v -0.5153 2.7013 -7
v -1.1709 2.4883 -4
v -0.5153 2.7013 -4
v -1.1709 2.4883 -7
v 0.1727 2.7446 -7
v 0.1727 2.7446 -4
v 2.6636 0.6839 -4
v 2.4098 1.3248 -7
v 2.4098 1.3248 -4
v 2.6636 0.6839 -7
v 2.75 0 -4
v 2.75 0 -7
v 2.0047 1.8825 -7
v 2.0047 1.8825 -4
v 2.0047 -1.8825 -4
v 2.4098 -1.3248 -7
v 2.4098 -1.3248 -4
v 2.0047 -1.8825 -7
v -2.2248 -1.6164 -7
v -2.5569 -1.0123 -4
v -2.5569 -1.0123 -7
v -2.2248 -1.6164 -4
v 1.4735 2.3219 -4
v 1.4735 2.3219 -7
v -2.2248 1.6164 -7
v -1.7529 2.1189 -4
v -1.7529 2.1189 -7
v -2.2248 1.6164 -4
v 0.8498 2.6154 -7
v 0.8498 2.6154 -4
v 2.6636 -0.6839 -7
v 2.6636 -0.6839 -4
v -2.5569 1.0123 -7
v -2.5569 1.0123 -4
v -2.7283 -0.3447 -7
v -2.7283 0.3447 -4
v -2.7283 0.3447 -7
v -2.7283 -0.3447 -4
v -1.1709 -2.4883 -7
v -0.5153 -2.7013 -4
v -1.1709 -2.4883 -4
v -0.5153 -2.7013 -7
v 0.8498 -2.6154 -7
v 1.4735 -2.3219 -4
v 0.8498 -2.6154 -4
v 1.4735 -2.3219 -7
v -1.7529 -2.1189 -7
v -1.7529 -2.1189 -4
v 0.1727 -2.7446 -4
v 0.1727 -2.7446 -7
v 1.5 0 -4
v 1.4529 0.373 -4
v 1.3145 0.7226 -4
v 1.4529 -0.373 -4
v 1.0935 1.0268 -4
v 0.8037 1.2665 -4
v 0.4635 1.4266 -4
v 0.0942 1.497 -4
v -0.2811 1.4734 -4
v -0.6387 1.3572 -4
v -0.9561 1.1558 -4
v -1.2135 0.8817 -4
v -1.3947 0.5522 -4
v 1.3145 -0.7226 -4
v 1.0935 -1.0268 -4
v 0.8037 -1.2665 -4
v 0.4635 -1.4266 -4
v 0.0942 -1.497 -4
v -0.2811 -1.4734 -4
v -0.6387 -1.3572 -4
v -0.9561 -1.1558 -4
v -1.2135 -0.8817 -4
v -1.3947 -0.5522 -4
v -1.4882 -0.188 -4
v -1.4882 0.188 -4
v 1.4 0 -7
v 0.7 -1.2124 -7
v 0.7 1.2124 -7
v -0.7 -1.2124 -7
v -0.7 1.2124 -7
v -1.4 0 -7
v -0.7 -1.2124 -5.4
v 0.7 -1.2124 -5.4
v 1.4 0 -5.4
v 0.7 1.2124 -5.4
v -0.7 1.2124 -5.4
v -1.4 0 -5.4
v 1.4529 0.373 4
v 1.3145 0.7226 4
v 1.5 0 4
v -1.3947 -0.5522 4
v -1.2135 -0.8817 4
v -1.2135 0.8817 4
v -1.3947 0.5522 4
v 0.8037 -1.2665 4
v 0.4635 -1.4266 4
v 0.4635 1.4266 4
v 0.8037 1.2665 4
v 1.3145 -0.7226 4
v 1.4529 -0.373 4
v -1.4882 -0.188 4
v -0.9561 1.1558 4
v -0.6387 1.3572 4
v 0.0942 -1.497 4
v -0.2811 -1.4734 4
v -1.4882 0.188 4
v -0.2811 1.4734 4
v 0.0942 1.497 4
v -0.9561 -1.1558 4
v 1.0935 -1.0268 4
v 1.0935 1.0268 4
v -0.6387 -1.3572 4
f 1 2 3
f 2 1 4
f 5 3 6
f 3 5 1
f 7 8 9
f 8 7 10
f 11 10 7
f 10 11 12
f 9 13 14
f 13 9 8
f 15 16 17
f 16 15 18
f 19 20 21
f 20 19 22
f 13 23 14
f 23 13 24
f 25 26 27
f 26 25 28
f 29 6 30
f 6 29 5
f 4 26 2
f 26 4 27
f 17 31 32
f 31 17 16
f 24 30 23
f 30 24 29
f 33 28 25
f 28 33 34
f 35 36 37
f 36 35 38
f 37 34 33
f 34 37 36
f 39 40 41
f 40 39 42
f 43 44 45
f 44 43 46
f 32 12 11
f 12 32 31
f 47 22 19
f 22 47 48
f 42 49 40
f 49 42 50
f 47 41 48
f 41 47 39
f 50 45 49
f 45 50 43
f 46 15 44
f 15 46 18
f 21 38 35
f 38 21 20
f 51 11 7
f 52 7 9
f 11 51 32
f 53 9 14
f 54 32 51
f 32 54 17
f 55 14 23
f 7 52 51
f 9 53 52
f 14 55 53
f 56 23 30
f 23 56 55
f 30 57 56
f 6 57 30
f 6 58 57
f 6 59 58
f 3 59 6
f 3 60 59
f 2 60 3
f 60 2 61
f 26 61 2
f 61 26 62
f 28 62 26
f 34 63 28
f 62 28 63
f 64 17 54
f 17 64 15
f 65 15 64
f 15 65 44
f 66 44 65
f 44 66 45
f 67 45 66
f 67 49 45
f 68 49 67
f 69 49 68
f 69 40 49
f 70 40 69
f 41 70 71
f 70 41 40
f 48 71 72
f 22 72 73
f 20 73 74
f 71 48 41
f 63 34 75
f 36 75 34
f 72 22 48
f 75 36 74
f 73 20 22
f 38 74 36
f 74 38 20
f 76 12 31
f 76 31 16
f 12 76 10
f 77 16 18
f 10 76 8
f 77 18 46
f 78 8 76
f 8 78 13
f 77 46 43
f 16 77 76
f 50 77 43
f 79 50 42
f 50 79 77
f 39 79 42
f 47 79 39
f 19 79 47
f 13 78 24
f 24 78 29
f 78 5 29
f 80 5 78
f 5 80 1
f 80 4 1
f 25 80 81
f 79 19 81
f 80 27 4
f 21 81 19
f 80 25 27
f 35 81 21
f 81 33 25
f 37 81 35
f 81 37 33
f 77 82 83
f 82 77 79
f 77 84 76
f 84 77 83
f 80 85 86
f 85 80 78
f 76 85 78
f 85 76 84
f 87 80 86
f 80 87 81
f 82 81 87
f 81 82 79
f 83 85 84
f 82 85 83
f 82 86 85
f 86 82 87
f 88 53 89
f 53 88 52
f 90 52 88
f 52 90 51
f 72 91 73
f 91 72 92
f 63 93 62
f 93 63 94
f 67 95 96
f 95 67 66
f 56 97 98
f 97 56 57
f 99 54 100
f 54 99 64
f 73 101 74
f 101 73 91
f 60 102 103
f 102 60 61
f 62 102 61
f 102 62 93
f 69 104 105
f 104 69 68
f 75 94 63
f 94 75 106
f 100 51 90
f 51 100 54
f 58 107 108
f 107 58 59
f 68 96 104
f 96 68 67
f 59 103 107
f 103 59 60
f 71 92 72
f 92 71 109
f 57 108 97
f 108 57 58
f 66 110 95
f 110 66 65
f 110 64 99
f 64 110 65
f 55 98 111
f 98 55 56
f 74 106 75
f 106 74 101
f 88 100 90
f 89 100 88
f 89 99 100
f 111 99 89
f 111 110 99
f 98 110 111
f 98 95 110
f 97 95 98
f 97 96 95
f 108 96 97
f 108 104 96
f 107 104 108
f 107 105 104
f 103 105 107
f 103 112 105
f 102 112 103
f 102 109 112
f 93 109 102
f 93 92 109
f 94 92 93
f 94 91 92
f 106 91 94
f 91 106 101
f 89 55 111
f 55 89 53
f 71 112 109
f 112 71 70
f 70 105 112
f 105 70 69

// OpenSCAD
// file: lib/screw_nuts.scad
$fn=25;

module screw_m3(h=20, button=false){
    cylinder(d=3, h=h, center=true);
    translate([0, 0, -h/2-1.5])
        difference(){
            cylinder(d=5.5, h=3, center=true);
            translate([0, 0, -0.8])
                cylinder(d=2.8, h=1.8, $fn=6, center=true);
        }
}

module screw_m4(h=20, button=false){
    cylinder(d=4, h=h, center=true);
    translate([0, 0, -h/2-2])
        difference(){
            if (button) {
                translate([0, 0, 2])
                    scale([1, 1, 6/7.5])
                    sphere(d=7.5);
            } else {
                cylinder(d=7, h=4, center=true);
            }
            if (button) {
                 translate([0, 0, 5])
                    cube([7.6, 7.6, 6], center=true);
            }
            translate([0, 0, -0.8])
                cylinder(d=3.5, h=2.5, $fn=6, center=true);
        }
}

module nut_m3(){
    difference(){
        cylinder(d=6, h=2.4, $fn=6);
        translate([0, 0, -0.05])
            cylinder(d=3, h=2.5);
    }
}

module nut_m4(){
    difference(){
        cylinder(d=7.6, h=3.2, $fn=6);
        translate([0, 0, -0.05])
            cylinder(d=4, h=3.3);
    }
}

module washer_m3(h){
    difference(){
        cylinder(d=8, h=h, center=true);
        cylinder(d=3.5, h=h+0.1, center=true);
    }
}
// main file
// NAME: Screw M3x8
// COLOR: 80
// CATEGORY: Support

include <lib/screw_nuts.scad>

screw_m3(8);
